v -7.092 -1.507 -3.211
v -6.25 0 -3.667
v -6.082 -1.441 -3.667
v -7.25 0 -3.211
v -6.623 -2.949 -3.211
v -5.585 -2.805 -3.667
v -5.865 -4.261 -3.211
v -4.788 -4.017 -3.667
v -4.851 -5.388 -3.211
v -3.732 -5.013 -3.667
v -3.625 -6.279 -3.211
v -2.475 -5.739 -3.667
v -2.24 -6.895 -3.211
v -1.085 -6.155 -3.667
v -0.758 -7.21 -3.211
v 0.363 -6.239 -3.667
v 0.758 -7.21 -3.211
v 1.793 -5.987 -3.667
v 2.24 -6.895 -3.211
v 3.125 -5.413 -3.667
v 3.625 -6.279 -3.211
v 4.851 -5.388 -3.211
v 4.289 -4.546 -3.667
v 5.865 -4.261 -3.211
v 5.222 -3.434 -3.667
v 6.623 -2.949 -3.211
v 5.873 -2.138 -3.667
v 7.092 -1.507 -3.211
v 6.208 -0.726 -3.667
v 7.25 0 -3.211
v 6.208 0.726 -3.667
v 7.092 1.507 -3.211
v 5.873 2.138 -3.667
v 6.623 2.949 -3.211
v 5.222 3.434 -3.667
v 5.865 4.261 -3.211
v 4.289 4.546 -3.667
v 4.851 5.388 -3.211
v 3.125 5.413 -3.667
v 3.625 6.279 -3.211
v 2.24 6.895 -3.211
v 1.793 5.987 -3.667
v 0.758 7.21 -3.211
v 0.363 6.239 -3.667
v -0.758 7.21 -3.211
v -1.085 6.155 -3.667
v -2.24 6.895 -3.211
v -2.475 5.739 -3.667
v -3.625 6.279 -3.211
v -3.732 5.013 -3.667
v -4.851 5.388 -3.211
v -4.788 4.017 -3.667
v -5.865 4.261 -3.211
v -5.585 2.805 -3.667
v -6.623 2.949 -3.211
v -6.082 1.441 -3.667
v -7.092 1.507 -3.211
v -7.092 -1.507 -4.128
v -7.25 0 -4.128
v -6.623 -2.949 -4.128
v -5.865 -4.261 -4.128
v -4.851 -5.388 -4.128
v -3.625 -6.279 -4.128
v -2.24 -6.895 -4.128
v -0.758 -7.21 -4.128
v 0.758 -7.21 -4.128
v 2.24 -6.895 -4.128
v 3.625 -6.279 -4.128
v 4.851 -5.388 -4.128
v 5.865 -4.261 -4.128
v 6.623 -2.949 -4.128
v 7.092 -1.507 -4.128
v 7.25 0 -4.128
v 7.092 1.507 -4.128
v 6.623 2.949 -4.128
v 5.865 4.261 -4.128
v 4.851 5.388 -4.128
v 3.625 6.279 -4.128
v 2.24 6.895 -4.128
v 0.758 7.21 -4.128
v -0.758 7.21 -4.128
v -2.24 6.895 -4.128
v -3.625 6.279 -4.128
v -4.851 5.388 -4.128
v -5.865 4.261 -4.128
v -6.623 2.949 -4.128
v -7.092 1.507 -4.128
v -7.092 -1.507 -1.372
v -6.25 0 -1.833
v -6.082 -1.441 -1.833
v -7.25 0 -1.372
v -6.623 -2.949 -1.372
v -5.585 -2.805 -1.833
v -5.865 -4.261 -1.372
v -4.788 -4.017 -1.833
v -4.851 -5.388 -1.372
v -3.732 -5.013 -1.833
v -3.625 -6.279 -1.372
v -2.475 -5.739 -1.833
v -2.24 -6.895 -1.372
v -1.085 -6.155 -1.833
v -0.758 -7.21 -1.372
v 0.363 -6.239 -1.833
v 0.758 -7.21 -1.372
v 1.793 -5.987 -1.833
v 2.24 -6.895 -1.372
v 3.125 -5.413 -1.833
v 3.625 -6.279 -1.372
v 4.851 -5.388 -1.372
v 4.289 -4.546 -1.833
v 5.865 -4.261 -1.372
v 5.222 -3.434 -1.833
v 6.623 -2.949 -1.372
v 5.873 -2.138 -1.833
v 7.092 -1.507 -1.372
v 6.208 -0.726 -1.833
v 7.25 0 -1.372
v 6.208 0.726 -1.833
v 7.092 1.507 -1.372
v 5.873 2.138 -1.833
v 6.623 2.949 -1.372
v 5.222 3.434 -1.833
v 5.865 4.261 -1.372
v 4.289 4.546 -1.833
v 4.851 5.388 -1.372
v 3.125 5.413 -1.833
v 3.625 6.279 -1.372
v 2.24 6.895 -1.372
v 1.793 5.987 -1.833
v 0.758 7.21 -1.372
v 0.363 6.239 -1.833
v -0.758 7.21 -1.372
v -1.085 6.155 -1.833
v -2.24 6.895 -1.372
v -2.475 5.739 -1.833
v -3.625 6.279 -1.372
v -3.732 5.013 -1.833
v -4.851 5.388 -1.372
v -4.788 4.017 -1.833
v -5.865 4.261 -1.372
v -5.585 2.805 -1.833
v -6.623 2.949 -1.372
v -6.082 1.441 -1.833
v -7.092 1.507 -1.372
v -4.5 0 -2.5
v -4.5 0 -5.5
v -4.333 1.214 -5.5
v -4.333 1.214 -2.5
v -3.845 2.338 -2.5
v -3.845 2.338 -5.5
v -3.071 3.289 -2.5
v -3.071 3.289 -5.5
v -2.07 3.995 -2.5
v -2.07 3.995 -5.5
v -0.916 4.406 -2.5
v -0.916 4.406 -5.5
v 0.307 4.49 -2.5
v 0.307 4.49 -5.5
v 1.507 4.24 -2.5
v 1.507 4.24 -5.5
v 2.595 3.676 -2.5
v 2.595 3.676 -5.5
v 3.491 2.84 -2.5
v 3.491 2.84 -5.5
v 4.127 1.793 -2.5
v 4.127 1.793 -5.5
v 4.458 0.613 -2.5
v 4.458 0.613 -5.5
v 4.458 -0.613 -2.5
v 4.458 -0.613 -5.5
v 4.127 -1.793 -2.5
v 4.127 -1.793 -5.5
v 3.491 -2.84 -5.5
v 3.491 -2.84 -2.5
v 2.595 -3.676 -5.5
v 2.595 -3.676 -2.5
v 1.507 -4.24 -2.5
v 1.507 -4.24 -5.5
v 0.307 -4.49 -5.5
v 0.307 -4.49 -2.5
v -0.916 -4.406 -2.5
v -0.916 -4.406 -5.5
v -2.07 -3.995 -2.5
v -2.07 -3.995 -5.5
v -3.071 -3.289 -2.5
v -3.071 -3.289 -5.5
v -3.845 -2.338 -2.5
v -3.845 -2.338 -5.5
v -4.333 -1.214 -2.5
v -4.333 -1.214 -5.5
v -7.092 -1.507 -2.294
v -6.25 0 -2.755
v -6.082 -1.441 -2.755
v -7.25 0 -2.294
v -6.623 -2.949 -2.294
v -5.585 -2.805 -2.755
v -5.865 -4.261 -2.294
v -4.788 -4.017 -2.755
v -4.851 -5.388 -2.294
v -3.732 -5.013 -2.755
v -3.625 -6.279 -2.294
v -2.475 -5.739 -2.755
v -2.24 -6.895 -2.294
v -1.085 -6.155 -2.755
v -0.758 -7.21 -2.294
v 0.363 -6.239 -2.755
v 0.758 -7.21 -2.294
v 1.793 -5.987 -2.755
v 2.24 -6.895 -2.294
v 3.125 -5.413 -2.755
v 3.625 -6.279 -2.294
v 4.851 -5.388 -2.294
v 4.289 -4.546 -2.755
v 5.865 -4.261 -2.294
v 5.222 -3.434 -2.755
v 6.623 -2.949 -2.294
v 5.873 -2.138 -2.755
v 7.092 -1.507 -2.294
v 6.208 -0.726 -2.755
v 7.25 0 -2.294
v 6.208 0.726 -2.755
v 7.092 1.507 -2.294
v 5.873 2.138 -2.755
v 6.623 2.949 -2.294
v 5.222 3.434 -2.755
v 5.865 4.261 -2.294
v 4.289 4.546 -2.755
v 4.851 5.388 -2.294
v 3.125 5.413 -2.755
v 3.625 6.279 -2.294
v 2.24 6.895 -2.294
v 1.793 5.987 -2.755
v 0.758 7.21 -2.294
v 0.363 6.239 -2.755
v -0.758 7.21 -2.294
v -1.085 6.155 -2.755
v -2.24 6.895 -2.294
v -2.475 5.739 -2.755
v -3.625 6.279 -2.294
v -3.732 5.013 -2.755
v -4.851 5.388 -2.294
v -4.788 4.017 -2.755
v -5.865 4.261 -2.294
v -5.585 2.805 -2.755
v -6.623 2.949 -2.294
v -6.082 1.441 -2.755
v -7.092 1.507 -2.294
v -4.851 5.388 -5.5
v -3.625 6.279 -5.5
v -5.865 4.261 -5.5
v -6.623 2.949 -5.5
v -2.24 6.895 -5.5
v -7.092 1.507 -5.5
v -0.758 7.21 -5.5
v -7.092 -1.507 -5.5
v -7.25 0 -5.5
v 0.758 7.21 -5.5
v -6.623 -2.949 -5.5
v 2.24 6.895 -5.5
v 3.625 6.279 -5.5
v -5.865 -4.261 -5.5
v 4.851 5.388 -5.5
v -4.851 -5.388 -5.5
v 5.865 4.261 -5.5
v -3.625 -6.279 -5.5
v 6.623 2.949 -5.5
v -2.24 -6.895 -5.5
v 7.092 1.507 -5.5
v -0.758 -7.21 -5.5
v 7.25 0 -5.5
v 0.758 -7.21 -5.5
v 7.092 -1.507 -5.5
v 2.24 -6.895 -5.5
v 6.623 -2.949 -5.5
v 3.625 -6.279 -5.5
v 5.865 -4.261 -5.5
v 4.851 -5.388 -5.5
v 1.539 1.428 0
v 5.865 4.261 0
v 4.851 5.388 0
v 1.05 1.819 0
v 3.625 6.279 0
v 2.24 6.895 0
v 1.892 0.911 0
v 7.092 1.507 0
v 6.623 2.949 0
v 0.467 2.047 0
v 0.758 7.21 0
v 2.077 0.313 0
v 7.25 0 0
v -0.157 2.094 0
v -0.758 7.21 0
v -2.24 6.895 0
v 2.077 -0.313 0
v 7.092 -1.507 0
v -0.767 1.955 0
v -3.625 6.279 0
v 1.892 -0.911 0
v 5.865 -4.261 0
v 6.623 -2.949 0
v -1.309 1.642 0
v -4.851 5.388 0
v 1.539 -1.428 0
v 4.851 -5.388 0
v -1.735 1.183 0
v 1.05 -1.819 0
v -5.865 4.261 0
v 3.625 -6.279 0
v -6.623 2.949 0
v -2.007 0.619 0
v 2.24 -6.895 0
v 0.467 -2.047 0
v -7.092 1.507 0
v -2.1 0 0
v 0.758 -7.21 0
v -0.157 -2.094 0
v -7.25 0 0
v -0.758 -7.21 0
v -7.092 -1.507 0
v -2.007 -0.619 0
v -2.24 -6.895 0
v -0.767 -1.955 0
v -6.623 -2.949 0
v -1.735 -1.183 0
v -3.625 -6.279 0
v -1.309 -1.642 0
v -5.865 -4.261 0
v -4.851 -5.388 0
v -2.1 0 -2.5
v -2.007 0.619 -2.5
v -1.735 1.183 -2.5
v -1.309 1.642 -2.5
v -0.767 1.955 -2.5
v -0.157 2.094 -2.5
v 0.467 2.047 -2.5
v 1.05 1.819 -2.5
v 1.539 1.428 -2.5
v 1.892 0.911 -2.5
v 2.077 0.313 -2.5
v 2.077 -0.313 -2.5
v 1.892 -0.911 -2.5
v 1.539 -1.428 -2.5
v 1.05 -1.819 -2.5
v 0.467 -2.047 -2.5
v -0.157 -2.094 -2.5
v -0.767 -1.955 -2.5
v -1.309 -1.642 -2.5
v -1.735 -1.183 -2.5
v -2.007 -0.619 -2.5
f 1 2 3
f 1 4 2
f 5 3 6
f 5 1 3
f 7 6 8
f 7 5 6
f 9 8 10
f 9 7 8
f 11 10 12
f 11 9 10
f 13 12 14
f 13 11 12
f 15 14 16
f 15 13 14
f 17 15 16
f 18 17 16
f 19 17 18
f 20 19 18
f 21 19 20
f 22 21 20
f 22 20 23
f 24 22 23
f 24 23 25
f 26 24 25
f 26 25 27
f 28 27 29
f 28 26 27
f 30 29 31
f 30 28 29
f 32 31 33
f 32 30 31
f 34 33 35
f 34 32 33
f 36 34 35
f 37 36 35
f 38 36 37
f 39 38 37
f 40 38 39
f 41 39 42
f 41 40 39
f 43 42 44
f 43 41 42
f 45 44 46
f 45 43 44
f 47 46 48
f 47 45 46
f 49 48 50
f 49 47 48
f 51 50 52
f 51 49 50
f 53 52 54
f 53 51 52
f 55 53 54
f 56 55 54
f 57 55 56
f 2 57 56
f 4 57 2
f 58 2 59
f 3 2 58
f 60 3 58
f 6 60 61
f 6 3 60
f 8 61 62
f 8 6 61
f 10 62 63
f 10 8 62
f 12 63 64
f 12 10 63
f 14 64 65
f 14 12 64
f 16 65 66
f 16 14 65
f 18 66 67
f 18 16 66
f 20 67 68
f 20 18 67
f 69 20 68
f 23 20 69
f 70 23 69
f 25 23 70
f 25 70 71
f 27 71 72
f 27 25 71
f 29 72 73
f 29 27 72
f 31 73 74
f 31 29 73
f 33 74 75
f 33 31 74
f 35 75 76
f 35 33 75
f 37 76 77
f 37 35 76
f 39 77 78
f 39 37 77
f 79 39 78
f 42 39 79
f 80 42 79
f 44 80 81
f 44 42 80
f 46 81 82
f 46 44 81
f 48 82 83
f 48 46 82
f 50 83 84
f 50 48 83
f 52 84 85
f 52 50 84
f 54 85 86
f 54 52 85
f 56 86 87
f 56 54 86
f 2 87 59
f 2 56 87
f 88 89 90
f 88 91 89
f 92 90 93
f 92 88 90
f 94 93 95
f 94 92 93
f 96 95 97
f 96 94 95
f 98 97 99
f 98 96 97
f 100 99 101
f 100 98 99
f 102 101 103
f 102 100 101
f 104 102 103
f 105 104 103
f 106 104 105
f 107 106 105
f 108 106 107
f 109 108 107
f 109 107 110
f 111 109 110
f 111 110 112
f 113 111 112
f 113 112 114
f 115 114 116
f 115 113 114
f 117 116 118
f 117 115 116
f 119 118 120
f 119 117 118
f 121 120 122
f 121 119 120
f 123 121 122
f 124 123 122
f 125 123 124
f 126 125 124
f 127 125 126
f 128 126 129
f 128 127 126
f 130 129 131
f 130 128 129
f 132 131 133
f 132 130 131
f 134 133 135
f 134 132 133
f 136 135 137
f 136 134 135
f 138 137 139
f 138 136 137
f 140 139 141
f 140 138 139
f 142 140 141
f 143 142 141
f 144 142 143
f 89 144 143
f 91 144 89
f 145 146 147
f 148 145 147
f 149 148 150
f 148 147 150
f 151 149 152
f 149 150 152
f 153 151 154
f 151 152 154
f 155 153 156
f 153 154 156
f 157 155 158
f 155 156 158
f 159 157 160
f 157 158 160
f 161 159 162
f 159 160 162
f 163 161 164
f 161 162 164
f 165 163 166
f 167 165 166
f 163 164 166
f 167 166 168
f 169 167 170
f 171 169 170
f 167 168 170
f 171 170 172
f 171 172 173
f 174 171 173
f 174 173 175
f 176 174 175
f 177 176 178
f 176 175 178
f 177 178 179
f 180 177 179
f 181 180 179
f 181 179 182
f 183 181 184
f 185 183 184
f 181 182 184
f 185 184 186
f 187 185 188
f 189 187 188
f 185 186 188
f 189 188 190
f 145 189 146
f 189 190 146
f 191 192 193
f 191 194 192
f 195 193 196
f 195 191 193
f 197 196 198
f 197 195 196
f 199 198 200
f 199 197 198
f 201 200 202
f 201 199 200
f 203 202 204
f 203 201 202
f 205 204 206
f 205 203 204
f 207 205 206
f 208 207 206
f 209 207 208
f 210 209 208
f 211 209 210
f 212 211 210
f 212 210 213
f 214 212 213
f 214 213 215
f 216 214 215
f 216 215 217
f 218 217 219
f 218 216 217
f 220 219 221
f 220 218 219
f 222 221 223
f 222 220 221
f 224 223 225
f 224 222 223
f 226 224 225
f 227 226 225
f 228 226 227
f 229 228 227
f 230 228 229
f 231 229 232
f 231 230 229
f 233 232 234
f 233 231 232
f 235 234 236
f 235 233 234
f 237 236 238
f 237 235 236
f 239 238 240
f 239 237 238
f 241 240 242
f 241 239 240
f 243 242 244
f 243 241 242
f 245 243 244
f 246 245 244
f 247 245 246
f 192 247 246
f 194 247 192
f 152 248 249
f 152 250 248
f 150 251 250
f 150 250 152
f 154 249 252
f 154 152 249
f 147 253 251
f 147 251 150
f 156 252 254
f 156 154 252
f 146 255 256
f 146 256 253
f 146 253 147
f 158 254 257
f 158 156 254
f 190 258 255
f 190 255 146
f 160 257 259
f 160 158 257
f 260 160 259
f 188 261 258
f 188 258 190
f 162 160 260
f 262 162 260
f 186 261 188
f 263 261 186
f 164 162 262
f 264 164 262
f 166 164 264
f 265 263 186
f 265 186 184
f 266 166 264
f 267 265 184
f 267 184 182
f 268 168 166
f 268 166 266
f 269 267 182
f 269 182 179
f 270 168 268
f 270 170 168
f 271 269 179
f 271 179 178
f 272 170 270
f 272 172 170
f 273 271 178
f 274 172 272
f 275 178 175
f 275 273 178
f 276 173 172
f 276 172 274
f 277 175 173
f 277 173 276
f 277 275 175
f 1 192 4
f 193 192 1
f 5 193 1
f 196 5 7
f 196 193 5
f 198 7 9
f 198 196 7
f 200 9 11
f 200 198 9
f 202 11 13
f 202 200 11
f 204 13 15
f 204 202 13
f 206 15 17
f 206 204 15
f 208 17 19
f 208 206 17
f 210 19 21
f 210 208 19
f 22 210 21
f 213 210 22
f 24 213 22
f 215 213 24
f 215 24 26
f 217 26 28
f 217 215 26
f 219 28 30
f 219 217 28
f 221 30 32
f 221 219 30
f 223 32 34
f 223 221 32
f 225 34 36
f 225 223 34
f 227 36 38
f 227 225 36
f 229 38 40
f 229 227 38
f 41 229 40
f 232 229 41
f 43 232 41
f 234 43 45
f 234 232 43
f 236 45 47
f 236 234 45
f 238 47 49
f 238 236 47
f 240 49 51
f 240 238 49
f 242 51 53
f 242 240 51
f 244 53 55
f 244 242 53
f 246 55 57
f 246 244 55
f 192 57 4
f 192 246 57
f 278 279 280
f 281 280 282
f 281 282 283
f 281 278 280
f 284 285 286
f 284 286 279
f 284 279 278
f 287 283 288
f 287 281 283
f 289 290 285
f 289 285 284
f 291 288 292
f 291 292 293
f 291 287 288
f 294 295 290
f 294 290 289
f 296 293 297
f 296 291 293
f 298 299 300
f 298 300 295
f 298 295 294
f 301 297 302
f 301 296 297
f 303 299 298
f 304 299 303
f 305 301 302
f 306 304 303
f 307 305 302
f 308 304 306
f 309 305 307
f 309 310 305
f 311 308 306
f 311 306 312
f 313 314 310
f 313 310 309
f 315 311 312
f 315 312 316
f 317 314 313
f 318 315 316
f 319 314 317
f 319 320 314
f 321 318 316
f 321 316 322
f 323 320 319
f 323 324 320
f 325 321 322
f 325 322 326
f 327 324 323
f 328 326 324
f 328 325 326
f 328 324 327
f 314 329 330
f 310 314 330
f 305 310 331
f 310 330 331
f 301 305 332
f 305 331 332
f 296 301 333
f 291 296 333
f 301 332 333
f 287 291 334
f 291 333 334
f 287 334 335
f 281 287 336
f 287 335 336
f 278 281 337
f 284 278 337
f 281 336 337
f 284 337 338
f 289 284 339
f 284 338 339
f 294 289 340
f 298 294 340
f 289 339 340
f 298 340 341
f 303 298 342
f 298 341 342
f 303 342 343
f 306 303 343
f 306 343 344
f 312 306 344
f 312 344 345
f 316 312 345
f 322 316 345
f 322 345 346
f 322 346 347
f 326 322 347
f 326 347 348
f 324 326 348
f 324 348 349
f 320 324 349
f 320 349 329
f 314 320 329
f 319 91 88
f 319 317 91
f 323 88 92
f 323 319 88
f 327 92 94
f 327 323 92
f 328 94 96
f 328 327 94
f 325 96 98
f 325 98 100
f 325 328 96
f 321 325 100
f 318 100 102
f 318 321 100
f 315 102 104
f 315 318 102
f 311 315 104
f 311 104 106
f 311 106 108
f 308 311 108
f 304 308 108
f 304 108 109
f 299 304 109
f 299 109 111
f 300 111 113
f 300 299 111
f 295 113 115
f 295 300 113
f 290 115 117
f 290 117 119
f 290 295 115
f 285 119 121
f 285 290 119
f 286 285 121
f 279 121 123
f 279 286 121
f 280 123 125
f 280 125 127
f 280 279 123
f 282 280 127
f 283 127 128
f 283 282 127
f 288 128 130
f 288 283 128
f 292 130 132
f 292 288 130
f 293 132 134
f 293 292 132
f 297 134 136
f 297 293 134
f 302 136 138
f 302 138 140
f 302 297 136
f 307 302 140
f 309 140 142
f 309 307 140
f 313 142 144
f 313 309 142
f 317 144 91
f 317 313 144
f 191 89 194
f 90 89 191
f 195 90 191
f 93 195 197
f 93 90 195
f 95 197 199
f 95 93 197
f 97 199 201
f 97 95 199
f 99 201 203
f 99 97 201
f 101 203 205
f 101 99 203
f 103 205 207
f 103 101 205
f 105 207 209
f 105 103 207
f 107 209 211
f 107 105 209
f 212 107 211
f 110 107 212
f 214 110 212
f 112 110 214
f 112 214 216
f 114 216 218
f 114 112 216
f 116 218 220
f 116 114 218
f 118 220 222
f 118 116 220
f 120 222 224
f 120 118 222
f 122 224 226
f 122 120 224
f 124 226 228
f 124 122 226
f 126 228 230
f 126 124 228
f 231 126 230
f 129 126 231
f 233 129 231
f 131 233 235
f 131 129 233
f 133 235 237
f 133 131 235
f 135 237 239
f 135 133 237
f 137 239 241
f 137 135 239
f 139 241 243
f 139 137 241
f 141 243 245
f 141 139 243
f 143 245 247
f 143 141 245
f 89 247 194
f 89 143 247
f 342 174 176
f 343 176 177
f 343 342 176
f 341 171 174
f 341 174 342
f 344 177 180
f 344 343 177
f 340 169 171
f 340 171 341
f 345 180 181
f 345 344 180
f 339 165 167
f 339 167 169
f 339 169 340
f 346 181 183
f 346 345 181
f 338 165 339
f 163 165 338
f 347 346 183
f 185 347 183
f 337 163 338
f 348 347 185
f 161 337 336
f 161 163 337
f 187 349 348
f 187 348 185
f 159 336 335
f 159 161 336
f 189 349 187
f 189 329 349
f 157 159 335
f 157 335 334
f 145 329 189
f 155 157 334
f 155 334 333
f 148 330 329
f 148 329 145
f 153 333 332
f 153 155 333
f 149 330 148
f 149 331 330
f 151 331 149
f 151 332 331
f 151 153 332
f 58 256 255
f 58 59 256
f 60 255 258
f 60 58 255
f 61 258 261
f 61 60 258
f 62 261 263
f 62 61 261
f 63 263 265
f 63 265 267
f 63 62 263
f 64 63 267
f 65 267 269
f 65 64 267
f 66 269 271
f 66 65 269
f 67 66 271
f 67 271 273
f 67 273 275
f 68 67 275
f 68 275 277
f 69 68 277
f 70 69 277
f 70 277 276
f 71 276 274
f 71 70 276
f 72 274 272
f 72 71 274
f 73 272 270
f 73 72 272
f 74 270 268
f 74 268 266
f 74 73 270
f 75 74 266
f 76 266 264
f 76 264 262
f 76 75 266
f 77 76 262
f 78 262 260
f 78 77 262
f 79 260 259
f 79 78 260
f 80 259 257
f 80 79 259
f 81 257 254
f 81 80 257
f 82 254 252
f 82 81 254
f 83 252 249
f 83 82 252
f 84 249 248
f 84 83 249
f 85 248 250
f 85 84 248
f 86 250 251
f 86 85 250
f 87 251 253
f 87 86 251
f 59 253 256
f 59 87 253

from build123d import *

# Parameters (mm, degrees)
SKETCH3_R          = 4.5
CUT_EXTRUDE1_DEPTH = 3
SKETCH4_R          = 2.1
CUT_EXTRUDE2_DEPTH = 11.68293031


with BuildPart() as part:
    # Sketch2 → Revolve1 (revolve)
    with BuildSketch(Plane(origin=(0, 0, 0), x_dir=(1, 0, 0), z_dir=(0, 1, 0))):
        Polygon((0, 5.5), (-7.25, 5.5), (-7.25, 4.127624556), (-6.25, 3.666666667), (-7.25, 3.210957889), (-6.25, 2.755249111), (-7.25, 2.294291222), (-6.25, 1.833333333), (-7.25, 1.372375444), (-7.25, 0), (0, 0), align=None)
    revolve(axis=Axis((0, 0, -5.5), (0, 0, 1)))

    # Sketch3 → Cut-Extrude1 (cut)
    with BuildSketch(Plane(origin=(0, 0, -5.5), x_dir=(-1, 0, 0), z_dir=(0, 0, -1))):
        Circle(SKETCH3_R)
    extrude(amount=-CUT_EXTRUDE1_DEPTH, mode=Mode.SUBTRACT)

    # Sketch4 → Cut-Extrude2 (cut, through all)
    with BuildSketch(Plane(origin=(0, 0, -2.5), x_dir=(-1, 0, 0), z_dir=(0, 0, -1))):
        Circle(SKETCH4_R)
    extrude(amount=-CUT_EXTRUDE2_DEPTH, mode=Mode.SUBTRACT)


solid = part.part
